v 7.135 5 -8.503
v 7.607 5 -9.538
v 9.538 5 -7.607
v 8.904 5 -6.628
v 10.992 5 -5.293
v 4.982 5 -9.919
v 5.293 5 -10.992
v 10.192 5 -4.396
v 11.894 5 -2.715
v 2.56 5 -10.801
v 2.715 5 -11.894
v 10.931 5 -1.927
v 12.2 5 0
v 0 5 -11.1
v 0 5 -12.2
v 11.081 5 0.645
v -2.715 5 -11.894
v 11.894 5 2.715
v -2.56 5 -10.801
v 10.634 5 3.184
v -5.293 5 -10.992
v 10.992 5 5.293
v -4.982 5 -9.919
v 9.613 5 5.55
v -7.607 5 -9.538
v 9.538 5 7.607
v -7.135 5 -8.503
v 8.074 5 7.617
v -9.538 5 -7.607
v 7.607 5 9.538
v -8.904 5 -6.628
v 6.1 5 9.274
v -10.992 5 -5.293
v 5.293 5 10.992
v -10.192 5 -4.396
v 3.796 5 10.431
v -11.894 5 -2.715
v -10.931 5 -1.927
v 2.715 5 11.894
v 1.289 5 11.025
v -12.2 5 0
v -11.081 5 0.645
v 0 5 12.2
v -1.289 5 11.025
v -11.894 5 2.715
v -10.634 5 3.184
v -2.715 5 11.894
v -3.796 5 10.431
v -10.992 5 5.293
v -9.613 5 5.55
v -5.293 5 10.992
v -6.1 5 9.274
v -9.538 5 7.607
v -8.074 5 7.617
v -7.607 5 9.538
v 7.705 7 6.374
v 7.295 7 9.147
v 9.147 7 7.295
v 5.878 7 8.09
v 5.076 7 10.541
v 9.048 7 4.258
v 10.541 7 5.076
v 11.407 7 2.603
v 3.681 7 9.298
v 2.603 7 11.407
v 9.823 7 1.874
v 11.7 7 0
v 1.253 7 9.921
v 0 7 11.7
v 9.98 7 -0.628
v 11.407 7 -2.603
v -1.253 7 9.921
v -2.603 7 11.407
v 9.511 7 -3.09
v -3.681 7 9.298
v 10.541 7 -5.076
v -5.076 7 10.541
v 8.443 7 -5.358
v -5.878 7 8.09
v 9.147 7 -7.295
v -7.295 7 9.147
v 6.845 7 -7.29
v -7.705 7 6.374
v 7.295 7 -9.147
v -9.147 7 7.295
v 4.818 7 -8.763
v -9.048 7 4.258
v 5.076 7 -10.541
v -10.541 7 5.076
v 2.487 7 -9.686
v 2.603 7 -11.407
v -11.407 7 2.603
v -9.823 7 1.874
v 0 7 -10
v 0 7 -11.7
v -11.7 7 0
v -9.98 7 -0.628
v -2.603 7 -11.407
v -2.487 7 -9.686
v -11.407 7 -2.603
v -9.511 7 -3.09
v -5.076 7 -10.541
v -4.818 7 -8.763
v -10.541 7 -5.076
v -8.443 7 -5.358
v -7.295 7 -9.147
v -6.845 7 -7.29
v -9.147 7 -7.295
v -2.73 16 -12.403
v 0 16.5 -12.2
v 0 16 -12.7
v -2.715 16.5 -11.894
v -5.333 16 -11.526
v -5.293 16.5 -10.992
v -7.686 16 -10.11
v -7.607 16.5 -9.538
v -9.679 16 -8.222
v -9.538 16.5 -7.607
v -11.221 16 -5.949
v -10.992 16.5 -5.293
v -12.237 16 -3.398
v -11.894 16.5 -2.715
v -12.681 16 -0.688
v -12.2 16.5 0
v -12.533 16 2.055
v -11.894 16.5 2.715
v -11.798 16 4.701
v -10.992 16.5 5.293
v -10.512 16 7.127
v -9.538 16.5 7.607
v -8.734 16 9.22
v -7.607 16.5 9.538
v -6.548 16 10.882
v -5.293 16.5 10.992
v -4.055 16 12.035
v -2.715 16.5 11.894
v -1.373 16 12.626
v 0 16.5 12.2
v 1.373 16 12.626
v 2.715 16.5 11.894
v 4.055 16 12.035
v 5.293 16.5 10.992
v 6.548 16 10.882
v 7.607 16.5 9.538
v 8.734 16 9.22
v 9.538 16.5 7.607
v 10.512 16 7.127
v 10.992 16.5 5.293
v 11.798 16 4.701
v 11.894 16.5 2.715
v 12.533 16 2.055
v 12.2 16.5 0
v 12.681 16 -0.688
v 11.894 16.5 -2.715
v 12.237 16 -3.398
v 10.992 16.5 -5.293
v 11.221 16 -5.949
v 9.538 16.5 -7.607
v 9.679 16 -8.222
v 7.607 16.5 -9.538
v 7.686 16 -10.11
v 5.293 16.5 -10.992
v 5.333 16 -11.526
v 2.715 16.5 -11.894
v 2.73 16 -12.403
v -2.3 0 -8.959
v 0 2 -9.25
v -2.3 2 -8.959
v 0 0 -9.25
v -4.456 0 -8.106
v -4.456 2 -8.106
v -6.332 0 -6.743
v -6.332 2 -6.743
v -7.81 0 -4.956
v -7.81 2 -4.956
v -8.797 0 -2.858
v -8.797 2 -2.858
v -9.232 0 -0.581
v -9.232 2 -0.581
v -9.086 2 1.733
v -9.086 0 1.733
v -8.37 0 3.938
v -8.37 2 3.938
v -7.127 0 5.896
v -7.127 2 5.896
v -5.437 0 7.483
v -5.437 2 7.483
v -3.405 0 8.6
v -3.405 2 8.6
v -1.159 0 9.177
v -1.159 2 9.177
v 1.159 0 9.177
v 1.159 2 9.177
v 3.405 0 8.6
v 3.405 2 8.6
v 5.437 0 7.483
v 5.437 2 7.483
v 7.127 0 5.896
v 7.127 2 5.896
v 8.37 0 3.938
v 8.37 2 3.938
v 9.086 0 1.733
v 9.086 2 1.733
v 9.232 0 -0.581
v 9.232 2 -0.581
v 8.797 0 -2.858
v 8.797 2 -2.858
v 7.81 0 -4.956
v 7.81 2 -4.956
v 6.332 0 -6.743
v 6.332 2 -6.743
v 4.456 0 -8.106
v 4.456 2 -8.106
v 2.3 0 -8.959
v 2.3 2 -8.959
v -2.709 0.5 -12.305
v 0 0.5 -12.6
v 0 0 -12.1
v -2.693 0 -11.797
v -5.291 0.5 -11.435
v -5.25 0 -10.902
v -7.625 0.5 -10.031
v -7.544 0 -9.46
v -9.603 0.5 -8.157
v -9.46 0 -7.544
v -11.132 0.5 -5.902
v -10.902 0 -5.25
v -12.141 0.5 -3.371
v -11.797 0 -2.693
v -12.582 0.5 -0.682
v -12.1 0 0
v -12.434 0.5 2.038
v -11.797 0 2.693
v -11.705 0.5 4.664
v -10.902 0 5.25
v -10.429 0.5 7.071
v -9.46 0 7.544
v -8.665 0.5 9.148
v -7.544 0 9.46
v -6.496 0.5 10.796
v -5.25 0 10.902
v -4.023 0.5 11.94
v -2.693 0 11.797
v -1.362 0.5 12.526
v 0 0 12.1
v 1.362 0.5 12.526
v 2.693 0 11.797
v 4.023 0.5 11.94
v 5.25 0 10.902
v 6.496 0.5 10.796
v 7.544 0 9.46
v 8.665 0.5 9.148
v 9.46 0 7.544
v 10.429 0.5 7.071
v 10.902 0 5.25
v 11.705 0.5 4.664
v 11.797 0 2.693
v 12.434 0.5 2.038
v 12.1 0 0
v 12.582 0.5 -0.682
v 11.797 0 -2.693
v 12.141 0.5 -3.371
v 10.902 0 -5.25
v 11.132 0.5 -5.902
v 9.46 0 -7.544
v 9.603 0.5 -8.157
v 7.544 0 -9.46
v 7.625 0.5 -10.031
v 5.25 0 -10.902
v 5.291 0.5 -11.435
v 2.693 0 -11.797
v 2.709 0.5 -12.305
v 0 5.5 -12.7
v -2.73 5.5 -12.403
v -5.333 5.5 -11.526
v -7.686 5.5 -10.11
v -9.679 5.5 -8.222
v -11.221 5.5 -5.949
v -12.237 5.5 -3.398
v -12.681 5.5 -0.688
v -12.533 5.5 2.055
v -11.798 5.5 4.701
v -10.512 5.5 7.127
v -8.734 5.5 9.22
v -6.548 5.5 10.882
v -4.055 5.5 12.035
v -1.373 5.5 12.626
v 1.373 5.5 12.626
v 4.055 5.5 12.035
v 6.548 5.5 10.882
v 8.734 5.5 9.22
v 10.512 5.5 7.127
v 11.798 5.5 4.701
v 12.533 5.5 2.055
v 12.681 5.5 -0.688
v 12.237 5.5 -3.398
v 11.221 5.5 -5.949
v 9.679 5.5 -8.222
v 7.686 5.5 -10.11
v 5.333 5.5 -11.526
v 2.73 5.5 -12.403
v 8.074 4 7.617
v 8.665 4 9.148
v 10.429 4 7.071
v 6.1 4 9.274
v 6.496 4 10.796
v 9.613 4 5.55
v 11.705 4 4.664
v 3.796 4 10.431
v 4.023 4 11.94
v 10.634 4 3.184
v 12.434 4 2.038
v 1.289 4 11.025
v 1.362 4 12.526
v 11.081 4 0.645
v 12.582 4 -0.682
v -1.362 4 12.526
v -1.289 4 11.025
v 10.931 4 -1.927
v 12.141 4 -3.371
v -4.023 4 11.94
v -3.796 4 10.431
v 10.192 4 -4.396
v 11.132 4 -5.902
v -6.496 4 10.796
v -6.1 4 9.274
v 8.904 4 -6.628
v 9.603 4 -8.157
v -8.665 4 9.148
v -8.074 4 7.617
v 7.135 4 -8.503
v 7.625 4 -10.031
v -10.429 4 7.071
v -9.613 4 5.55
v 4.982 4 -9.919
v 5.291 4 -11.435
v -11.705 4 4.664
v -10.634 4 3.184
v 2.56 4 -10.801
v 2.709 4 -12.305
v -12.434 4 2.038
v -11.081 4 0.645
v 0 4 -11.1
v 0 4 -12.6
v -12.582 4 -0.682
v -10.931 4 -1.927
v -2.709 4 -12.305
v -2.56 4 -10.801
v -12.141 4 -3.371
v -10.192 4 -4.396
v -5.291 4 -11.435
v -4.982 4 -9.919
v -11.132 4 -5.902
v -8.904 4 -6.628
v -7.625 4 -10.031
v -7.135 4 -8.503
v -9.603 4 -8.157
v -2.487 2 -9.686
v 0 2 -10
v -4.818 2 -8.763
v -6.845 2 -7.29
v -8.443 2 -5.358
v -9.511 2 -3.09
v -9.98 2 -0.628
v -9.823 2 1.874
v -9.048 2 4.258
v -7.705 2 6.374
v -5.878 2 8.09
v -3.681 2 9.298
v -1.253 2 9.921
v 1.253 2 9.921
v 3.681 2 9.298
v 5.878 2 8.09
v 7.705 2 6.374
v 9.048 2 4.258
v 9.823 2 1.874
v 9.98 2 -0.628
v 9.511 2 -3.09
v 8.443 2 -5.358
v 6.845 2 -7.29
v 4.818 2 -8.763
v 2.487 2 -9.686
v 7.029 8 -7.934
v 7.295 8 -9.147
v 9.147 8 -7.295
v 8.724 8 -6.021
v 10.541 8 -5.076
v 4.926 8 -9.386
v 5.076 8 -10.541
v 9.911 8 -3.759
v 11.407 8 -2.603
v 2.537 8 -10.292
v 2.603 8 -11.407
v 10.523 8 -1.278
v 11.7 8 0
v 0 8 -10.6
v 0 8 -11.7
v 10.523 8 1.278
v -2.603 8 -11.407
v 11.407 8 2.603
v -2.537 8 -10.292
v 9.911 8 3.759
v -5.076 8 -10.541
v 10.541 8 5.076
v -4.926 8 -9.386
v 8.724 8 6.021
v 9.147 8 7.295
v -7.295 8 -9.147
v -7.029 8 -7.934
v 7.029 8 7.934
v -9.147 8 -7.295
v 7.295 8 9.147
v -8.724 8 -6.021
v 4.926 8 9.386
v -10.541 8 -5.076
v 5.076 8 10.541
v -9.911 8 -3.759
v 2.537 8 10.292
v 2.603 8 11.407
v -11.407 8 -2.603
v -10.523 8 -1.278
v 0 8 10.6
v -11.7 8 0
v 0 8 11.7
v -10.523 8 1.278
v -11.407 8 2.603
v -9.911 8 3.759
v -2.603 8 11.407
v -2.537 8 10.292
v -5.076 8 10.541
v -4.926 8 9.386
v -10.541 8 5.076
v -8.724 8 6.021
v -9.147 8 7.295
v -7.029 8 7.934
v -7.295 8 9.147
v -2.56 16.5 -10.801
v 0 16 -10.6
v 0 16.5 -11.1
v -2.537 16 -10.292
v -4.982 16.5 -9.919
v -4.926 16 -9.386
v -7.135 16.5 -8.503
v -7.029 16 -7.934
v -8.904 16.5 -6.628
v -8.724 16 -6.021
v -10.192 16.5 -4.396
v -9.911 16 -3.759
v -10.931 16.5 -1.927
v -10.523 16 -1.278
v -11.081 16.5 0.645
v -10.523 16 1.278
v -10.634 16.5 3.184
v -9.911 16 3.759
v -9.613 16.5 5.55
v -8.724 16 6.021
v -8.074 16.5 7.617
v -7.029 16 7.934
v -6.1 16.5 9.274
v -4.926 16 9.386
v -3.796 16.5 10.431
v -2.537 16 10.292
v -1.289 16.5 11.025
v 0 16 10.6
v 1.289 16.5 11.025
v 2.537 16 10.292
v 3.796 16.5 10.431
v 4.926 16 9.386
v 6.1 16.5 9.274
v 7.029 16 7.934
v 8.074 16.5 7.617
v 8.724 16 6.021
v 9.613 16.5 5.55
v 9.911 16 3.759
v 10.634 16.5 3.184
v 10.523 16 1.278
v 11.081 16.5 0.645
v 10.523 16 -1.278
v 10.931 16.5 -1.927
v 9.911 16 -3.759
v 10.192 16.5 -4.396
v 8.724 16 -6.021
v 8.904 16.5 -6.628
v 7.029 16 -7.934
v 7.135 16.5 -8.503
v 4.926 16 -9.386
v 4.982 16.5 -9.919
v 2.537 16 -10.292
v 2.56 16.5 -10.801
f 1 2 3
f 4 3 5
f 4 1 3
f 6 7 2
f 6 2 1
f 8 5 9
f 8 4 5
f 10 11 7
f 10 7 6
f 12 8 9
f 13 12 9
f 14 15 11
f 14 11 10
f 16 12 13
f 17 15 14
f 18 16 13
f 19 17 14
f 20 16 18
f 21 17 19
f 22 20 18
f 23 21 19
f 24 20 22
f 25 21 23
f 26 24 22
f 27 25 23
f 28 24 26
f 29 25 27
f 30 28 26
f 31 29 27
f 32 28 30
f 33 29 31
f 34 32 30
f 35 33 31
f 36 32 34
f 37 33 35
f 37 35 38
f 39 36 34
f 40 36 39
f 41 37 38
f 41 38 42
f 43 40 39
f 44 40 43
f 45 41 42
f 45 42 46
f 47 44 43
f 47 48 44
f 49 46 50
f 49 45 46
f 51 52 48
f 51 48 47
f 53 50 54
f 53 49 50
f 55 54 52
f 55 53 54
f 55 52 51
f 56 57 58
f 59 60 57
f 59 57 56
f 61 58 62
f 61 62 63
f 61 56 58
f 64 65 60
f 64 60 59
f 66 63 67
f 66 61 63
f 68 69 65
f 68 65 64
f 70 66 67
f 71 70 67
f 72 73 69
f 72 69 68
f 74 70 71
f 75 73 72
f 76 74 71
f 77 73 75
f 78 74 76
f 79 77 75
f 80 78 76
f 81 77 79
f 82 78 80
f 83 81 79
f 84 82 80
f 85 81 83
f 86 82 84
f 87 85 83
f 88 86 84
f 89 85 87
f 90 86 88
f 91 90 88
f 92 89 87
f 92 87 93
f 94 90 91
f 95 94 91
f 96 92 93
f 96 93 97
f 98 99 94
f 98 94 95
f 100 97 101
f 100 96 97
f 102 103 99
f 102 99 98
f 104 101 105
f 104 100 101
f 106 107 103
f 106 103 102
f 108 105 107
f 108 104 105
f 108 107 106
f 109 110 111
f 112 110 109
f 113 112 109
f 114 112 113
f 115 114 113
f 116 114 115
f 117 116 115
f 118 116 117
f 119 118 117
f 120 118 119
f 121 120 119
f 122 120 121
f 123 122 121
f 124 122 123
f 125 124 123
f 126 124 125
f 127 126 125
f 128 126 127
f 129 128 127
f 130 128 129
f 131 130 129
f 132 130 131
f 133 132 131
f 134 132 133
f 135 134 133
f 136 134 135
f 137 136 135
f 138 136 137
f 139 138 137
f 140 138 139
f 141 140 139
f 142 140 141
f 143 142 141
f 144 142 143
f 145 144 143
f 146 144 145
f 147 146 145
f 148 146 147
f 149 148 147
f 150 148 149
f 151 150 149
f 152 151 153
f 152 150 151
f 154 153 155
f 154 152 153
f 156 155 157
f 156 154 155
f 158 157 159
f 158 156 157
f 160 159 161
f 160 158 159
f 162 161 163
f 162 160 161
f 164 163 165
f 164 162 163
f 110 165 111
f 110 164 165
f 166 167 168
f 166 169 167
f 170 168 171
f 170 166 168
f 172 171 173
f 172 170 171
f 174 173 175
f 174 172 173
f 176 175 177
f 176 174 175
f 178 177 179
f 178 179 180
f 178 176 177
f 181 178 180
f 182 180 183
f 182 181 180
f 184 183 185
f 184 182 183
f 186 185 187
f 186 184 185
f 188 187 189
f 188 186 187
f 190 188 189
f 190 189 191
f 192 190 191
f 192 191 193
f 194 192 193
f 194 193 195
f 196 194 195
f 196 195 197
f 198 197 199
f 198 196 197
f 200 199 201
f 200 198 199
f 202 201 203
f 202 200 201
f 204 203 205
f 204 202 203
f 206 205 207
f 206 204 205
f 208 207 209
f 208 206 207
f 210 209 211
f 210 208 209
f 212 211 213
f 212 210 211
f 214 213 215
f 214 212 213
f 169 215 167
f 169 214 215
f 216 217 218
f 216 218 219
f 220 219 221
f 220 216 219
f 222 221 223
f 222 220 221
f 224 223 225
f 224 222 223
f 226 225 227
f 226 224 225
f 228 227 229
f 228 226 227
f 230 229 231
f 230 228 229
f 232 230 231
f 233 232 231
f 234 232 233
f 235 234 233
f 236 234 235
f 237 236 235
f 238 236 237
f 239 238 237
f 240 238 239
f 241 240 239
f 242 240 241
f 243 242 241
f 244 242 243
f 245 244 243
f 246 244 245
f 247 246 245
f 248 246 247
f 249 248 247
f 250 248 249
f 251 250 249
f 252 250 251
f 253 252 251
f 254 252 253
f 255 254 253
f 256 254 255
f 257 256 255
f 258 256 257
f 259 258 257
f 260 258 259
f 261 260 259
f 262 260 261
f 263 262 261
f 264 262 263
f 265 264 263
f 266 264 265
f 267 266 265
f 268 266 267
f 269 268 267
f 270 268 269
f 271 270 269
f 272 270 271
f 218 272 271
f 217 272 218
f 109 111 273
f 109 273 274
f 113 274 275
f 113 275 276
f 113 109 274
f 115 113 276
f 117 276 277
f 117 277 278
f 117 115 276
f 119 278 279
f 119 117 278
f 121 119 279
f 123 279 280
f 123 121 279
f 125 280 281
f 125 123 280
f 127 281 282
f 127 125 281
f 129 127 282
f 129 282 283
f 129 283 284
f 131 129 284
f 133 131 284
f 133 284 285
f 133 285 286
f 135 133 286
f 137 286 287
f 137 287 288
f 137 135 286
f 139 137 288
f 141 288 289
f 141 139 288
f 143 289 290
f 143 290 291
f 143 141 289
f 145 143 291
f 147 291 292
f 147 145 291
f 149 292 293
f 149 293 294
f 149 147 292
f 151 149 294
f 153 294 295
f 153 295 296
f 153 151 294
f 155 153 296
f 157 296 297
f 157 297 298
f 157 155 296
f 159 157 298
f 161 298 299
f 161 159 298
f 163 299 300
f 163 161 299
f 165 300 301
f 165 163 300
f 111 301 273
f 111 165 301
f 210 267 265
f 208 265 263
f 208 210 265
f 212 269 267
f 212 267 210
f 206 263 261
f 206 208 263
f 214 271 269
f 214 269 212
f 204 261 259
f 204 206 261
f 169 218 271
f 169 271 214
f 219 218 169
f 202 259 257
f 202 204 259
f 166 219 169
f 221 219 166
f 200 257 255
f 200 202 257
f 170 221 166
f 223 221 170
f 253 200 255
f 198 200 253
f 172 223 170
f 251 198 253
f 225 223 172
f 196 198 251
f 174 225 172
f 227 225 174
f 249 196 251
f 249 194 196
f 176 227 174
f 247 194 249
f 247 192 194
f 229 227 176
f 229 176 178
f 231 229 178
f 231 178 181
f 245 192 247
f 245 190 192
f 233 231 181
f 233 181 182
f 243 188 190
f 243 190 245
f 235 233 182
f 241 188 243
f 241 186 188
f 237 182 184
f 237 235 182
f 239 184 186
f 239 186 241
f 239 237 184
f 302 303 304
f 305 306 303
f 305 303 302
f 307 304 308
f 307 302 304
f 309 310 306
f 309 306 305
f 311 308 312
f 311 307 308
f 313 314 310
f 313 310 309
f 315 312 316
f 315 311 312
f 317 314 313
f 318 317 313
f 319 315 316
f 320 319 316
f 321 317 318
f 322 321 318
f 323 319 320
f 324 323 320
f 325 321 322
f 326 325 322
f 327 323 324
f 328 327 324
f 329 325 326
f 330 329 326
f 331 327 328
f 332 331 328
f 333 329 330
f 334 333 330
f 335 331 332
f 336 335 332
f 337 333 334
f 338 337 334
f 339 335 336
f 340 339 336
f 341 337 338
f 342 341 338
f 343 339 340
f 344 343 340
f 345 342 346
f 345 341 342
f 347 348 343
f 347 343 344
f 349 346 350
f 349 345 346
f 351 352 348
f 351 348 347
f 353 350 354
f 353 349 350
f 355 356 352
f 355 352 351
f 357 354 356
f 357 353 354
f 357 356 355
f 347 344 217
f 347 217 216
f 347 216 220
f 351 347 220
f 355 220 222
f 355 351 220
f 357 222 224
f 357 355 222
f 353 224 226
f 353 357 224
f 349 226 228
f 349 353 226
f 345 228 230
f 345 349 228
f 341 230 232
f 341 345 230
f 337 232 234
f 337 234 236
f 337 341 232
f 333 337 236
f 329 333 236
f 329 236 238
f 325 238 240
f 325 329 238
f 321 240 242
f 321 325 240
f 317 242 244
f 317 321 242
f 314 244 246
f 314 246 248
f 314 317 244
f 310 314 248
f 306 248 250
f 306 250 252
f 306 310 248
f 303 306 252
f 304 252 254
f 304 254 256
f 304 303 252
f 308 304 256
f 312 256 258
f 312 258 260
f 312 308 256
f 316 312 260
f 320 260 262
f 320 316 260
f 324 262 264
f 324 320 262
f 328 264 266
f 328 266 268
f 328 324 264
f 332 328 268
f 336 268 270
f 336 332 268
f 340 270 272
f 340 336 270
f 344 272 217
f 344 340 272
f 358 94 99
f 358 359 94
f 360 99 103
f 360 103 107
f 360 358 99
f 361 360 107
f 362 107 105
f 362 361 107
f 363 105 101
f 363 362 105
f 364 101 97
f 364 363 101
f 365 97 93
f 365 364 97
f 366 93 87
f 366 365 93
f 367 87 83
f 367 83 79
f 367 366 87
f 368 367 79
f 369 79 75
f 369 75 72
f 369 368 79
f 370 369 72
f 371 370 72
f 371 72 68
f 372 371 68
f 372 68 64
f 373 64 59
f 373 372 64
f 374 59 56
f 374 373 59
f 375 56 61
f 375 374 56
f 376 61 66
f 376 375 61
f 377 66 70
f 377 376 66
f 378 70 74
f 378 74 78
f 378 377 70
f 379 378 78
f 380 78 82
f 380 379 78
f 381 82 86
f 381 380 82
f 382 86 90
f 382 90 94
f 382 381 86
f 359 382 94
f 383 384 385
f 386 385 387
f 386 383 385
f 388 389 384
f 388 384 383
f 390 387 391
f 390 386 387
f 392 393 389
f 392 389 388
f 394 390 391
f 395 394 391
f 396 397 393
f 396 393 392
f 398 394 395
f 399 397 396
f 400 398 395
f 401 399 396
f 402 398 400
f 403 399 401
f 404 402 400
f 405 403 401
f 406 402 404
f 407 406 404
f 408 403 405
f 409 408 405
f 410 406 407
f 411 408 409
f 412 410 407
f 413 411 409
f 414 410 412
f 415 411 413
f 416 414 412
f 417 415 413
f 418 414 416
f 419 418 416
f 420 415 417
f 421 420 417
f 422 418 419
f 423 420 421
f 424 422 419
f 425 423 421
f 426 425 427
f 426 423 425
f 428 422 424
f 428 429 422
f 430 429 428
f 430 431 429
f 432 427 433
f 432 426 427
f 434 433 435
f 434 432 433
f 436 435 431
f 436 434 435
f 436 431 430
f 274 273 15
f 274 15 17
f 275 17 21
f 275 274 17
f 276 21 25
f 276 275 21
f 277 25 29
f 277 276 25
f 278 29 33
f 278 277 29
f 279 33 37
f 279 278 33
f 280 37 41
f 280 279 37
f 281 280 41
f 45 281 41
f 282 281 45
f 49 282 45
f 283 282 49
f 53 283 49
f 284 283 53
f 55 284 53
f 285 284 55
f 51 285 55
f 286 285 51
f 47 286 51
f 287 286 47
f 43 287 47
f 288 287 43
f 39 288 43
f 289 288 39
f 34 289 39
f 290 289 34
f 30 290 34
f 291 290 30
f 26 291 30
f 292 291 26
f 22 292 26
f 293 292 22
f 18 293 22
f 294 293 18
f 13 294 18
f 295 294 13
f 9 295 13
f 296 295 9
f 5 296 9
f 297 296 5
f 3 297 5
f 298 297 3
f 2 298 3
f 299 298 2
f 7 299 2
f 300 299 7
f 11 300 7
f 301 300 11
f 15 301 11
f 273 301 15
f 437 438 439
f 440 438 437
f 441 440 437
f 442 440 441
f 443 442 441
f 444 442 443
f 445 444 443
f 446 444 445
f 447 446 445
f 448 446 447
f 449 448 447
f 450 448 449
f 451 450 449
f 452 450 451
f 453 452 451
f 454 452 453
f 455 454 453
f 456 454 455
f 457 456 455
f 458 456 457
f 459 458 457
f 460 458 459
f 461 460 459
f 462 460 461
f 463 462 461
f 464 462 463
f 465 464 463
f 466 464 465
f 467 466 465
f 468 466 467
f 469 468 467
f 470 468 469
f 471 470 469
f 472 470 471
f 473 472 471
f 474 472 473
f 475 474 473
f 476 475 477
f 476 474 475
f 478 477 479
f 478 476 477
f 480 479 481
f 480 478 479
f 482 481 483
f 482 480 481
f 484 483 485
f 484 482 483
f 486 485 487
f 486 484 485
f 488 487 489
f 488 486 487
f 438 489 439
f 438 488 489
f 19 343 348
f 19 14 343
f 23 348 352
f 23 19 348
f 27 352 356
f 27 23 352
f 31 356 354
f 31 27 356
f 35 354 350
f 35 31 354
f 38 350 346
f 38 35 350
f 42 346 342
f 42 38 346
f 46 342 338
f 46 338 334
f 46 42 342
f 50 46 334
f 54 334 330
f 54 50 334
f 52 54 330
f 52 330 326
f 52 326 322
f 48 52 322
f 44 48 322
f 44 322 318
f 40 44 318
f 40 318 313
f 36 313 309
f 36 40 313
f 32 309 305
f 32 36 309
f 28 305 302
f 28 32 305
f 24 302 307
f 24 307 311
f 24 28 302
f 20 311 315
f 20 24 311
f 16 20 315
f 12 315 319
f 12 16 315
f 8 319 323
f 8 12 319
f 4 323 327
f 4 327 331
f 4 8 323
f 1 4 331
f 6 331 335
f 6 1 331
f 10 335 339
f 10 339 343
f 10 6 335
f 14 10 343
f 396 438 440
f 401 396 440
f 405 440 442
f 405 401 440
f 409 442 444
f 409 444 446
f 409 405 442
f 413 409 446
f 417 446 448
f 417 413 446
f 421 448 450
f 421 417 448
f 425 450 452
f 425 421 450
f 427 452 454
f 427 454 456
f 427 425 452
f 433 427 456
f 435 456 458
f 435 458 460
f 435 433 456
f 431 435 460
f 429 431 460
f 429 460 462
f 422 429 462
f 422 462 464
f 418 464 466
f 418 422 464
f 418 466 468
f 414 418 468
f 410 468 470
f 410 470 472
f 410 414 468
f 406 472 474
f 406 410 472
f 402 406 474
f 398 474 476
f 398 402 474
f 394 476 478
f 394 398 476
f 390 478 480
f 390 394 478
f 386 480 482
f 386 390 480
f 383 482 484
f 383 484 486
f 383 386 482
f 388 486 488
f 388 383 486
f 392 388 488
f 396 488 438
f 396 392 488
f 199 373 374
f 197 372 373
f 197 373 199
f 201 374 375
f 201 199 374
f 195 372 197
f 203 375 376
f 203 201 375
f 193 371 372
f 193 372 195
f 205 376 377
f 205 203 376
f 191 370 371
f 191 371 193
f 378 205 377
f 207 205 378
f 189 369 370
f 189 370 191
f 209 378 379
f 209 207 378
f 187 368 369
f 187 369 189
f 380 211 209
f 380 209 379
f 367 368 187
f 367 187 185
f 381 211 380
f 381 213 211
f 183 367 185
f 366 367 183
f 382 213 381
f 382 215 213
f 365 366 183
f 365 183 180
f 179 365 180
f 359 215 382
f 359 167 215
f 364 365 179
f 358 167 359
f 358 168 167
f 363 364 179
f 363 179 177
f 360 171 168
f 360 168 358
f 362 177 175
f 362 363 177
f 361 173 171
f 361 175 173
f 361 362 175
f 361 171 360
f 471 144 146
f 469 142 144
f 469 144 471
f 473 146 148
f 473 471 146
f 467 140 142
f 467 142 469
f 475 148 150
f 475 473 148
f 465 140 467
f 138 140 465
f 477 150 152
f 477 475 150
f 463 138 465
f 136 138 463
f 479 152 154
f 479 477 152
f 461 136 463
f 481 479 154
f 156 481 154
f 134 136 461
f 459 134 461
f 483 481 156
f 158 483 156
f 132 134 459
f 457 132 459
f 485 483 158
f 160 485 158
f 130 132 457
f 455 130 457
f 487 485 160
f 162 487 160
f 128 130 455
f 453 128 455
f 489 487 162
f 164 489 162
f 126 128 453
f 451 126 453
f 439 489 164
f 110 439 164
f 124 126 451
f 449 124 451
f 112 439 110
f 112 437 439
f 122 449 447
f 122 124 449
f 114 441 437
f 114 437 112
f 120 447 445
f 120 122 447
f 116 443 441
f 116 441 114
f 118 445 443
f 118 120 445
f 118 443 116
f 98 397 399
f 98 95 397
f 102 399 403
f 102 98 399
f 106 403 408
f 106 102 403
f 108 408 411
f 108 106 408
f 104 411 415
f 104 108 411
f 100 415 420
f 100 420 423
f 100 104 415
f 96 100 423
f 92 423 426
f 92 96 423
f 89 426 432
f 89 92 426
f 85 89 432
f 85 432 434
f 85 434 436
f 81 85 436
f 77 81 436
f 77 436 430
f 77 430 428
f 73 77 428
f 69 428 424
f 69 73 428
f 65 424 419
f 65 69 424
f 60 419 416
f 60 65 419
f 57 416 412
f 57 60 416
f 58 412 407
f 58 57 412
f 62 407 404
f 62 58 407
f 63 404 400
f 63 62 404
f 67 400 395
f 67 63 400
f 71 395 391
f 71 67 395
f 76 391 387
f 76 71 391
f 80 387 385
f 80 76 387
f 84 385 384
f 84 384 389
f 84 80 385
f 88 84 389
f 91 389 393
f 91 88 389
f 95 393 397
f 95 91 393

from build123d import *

# Parameters (mm, degrees)
CHAMFER_1_SIZE = 0.5


with BuildPart() as part:
    # 草图1 → 旋转1 (revolve)
    with BuildSketch(Plane.XY, mode=Mode.PRIVATE) as revolve_1_sk:
        Polygon((9.25, 0), (12.6, 0), (12.6, 4), (11.1, 4), (11.1, 5), (12.7, 5), (12.7, 16.5), (10.6, 16.5), (10.6, 8), (11.7, 8), (11.7, 7), (10, 7), (10, 2), (9.25, 2), align=None)
    revolve(revolve_1_sk.sketch.rotate(Axis((0, 0, 0), (0, 1, 0)), 90), axis=Axis((0, 0, 0), (0, 1, 0)))  # turned: the seam where the file's is

    # 倒角1
    chamfer_1_edges = [part.edges().sort_by_distance(p)[0] for p in [
        (0, 16.5, 10.6),
        (0, 16.5, 12.7),
        (0, 5, 12.7),
        (0, 0, 12.6),
    ]]
    chamfer(chamfer_1_edges, length=CHAMFER_1_SIZE)


solid = part.part
